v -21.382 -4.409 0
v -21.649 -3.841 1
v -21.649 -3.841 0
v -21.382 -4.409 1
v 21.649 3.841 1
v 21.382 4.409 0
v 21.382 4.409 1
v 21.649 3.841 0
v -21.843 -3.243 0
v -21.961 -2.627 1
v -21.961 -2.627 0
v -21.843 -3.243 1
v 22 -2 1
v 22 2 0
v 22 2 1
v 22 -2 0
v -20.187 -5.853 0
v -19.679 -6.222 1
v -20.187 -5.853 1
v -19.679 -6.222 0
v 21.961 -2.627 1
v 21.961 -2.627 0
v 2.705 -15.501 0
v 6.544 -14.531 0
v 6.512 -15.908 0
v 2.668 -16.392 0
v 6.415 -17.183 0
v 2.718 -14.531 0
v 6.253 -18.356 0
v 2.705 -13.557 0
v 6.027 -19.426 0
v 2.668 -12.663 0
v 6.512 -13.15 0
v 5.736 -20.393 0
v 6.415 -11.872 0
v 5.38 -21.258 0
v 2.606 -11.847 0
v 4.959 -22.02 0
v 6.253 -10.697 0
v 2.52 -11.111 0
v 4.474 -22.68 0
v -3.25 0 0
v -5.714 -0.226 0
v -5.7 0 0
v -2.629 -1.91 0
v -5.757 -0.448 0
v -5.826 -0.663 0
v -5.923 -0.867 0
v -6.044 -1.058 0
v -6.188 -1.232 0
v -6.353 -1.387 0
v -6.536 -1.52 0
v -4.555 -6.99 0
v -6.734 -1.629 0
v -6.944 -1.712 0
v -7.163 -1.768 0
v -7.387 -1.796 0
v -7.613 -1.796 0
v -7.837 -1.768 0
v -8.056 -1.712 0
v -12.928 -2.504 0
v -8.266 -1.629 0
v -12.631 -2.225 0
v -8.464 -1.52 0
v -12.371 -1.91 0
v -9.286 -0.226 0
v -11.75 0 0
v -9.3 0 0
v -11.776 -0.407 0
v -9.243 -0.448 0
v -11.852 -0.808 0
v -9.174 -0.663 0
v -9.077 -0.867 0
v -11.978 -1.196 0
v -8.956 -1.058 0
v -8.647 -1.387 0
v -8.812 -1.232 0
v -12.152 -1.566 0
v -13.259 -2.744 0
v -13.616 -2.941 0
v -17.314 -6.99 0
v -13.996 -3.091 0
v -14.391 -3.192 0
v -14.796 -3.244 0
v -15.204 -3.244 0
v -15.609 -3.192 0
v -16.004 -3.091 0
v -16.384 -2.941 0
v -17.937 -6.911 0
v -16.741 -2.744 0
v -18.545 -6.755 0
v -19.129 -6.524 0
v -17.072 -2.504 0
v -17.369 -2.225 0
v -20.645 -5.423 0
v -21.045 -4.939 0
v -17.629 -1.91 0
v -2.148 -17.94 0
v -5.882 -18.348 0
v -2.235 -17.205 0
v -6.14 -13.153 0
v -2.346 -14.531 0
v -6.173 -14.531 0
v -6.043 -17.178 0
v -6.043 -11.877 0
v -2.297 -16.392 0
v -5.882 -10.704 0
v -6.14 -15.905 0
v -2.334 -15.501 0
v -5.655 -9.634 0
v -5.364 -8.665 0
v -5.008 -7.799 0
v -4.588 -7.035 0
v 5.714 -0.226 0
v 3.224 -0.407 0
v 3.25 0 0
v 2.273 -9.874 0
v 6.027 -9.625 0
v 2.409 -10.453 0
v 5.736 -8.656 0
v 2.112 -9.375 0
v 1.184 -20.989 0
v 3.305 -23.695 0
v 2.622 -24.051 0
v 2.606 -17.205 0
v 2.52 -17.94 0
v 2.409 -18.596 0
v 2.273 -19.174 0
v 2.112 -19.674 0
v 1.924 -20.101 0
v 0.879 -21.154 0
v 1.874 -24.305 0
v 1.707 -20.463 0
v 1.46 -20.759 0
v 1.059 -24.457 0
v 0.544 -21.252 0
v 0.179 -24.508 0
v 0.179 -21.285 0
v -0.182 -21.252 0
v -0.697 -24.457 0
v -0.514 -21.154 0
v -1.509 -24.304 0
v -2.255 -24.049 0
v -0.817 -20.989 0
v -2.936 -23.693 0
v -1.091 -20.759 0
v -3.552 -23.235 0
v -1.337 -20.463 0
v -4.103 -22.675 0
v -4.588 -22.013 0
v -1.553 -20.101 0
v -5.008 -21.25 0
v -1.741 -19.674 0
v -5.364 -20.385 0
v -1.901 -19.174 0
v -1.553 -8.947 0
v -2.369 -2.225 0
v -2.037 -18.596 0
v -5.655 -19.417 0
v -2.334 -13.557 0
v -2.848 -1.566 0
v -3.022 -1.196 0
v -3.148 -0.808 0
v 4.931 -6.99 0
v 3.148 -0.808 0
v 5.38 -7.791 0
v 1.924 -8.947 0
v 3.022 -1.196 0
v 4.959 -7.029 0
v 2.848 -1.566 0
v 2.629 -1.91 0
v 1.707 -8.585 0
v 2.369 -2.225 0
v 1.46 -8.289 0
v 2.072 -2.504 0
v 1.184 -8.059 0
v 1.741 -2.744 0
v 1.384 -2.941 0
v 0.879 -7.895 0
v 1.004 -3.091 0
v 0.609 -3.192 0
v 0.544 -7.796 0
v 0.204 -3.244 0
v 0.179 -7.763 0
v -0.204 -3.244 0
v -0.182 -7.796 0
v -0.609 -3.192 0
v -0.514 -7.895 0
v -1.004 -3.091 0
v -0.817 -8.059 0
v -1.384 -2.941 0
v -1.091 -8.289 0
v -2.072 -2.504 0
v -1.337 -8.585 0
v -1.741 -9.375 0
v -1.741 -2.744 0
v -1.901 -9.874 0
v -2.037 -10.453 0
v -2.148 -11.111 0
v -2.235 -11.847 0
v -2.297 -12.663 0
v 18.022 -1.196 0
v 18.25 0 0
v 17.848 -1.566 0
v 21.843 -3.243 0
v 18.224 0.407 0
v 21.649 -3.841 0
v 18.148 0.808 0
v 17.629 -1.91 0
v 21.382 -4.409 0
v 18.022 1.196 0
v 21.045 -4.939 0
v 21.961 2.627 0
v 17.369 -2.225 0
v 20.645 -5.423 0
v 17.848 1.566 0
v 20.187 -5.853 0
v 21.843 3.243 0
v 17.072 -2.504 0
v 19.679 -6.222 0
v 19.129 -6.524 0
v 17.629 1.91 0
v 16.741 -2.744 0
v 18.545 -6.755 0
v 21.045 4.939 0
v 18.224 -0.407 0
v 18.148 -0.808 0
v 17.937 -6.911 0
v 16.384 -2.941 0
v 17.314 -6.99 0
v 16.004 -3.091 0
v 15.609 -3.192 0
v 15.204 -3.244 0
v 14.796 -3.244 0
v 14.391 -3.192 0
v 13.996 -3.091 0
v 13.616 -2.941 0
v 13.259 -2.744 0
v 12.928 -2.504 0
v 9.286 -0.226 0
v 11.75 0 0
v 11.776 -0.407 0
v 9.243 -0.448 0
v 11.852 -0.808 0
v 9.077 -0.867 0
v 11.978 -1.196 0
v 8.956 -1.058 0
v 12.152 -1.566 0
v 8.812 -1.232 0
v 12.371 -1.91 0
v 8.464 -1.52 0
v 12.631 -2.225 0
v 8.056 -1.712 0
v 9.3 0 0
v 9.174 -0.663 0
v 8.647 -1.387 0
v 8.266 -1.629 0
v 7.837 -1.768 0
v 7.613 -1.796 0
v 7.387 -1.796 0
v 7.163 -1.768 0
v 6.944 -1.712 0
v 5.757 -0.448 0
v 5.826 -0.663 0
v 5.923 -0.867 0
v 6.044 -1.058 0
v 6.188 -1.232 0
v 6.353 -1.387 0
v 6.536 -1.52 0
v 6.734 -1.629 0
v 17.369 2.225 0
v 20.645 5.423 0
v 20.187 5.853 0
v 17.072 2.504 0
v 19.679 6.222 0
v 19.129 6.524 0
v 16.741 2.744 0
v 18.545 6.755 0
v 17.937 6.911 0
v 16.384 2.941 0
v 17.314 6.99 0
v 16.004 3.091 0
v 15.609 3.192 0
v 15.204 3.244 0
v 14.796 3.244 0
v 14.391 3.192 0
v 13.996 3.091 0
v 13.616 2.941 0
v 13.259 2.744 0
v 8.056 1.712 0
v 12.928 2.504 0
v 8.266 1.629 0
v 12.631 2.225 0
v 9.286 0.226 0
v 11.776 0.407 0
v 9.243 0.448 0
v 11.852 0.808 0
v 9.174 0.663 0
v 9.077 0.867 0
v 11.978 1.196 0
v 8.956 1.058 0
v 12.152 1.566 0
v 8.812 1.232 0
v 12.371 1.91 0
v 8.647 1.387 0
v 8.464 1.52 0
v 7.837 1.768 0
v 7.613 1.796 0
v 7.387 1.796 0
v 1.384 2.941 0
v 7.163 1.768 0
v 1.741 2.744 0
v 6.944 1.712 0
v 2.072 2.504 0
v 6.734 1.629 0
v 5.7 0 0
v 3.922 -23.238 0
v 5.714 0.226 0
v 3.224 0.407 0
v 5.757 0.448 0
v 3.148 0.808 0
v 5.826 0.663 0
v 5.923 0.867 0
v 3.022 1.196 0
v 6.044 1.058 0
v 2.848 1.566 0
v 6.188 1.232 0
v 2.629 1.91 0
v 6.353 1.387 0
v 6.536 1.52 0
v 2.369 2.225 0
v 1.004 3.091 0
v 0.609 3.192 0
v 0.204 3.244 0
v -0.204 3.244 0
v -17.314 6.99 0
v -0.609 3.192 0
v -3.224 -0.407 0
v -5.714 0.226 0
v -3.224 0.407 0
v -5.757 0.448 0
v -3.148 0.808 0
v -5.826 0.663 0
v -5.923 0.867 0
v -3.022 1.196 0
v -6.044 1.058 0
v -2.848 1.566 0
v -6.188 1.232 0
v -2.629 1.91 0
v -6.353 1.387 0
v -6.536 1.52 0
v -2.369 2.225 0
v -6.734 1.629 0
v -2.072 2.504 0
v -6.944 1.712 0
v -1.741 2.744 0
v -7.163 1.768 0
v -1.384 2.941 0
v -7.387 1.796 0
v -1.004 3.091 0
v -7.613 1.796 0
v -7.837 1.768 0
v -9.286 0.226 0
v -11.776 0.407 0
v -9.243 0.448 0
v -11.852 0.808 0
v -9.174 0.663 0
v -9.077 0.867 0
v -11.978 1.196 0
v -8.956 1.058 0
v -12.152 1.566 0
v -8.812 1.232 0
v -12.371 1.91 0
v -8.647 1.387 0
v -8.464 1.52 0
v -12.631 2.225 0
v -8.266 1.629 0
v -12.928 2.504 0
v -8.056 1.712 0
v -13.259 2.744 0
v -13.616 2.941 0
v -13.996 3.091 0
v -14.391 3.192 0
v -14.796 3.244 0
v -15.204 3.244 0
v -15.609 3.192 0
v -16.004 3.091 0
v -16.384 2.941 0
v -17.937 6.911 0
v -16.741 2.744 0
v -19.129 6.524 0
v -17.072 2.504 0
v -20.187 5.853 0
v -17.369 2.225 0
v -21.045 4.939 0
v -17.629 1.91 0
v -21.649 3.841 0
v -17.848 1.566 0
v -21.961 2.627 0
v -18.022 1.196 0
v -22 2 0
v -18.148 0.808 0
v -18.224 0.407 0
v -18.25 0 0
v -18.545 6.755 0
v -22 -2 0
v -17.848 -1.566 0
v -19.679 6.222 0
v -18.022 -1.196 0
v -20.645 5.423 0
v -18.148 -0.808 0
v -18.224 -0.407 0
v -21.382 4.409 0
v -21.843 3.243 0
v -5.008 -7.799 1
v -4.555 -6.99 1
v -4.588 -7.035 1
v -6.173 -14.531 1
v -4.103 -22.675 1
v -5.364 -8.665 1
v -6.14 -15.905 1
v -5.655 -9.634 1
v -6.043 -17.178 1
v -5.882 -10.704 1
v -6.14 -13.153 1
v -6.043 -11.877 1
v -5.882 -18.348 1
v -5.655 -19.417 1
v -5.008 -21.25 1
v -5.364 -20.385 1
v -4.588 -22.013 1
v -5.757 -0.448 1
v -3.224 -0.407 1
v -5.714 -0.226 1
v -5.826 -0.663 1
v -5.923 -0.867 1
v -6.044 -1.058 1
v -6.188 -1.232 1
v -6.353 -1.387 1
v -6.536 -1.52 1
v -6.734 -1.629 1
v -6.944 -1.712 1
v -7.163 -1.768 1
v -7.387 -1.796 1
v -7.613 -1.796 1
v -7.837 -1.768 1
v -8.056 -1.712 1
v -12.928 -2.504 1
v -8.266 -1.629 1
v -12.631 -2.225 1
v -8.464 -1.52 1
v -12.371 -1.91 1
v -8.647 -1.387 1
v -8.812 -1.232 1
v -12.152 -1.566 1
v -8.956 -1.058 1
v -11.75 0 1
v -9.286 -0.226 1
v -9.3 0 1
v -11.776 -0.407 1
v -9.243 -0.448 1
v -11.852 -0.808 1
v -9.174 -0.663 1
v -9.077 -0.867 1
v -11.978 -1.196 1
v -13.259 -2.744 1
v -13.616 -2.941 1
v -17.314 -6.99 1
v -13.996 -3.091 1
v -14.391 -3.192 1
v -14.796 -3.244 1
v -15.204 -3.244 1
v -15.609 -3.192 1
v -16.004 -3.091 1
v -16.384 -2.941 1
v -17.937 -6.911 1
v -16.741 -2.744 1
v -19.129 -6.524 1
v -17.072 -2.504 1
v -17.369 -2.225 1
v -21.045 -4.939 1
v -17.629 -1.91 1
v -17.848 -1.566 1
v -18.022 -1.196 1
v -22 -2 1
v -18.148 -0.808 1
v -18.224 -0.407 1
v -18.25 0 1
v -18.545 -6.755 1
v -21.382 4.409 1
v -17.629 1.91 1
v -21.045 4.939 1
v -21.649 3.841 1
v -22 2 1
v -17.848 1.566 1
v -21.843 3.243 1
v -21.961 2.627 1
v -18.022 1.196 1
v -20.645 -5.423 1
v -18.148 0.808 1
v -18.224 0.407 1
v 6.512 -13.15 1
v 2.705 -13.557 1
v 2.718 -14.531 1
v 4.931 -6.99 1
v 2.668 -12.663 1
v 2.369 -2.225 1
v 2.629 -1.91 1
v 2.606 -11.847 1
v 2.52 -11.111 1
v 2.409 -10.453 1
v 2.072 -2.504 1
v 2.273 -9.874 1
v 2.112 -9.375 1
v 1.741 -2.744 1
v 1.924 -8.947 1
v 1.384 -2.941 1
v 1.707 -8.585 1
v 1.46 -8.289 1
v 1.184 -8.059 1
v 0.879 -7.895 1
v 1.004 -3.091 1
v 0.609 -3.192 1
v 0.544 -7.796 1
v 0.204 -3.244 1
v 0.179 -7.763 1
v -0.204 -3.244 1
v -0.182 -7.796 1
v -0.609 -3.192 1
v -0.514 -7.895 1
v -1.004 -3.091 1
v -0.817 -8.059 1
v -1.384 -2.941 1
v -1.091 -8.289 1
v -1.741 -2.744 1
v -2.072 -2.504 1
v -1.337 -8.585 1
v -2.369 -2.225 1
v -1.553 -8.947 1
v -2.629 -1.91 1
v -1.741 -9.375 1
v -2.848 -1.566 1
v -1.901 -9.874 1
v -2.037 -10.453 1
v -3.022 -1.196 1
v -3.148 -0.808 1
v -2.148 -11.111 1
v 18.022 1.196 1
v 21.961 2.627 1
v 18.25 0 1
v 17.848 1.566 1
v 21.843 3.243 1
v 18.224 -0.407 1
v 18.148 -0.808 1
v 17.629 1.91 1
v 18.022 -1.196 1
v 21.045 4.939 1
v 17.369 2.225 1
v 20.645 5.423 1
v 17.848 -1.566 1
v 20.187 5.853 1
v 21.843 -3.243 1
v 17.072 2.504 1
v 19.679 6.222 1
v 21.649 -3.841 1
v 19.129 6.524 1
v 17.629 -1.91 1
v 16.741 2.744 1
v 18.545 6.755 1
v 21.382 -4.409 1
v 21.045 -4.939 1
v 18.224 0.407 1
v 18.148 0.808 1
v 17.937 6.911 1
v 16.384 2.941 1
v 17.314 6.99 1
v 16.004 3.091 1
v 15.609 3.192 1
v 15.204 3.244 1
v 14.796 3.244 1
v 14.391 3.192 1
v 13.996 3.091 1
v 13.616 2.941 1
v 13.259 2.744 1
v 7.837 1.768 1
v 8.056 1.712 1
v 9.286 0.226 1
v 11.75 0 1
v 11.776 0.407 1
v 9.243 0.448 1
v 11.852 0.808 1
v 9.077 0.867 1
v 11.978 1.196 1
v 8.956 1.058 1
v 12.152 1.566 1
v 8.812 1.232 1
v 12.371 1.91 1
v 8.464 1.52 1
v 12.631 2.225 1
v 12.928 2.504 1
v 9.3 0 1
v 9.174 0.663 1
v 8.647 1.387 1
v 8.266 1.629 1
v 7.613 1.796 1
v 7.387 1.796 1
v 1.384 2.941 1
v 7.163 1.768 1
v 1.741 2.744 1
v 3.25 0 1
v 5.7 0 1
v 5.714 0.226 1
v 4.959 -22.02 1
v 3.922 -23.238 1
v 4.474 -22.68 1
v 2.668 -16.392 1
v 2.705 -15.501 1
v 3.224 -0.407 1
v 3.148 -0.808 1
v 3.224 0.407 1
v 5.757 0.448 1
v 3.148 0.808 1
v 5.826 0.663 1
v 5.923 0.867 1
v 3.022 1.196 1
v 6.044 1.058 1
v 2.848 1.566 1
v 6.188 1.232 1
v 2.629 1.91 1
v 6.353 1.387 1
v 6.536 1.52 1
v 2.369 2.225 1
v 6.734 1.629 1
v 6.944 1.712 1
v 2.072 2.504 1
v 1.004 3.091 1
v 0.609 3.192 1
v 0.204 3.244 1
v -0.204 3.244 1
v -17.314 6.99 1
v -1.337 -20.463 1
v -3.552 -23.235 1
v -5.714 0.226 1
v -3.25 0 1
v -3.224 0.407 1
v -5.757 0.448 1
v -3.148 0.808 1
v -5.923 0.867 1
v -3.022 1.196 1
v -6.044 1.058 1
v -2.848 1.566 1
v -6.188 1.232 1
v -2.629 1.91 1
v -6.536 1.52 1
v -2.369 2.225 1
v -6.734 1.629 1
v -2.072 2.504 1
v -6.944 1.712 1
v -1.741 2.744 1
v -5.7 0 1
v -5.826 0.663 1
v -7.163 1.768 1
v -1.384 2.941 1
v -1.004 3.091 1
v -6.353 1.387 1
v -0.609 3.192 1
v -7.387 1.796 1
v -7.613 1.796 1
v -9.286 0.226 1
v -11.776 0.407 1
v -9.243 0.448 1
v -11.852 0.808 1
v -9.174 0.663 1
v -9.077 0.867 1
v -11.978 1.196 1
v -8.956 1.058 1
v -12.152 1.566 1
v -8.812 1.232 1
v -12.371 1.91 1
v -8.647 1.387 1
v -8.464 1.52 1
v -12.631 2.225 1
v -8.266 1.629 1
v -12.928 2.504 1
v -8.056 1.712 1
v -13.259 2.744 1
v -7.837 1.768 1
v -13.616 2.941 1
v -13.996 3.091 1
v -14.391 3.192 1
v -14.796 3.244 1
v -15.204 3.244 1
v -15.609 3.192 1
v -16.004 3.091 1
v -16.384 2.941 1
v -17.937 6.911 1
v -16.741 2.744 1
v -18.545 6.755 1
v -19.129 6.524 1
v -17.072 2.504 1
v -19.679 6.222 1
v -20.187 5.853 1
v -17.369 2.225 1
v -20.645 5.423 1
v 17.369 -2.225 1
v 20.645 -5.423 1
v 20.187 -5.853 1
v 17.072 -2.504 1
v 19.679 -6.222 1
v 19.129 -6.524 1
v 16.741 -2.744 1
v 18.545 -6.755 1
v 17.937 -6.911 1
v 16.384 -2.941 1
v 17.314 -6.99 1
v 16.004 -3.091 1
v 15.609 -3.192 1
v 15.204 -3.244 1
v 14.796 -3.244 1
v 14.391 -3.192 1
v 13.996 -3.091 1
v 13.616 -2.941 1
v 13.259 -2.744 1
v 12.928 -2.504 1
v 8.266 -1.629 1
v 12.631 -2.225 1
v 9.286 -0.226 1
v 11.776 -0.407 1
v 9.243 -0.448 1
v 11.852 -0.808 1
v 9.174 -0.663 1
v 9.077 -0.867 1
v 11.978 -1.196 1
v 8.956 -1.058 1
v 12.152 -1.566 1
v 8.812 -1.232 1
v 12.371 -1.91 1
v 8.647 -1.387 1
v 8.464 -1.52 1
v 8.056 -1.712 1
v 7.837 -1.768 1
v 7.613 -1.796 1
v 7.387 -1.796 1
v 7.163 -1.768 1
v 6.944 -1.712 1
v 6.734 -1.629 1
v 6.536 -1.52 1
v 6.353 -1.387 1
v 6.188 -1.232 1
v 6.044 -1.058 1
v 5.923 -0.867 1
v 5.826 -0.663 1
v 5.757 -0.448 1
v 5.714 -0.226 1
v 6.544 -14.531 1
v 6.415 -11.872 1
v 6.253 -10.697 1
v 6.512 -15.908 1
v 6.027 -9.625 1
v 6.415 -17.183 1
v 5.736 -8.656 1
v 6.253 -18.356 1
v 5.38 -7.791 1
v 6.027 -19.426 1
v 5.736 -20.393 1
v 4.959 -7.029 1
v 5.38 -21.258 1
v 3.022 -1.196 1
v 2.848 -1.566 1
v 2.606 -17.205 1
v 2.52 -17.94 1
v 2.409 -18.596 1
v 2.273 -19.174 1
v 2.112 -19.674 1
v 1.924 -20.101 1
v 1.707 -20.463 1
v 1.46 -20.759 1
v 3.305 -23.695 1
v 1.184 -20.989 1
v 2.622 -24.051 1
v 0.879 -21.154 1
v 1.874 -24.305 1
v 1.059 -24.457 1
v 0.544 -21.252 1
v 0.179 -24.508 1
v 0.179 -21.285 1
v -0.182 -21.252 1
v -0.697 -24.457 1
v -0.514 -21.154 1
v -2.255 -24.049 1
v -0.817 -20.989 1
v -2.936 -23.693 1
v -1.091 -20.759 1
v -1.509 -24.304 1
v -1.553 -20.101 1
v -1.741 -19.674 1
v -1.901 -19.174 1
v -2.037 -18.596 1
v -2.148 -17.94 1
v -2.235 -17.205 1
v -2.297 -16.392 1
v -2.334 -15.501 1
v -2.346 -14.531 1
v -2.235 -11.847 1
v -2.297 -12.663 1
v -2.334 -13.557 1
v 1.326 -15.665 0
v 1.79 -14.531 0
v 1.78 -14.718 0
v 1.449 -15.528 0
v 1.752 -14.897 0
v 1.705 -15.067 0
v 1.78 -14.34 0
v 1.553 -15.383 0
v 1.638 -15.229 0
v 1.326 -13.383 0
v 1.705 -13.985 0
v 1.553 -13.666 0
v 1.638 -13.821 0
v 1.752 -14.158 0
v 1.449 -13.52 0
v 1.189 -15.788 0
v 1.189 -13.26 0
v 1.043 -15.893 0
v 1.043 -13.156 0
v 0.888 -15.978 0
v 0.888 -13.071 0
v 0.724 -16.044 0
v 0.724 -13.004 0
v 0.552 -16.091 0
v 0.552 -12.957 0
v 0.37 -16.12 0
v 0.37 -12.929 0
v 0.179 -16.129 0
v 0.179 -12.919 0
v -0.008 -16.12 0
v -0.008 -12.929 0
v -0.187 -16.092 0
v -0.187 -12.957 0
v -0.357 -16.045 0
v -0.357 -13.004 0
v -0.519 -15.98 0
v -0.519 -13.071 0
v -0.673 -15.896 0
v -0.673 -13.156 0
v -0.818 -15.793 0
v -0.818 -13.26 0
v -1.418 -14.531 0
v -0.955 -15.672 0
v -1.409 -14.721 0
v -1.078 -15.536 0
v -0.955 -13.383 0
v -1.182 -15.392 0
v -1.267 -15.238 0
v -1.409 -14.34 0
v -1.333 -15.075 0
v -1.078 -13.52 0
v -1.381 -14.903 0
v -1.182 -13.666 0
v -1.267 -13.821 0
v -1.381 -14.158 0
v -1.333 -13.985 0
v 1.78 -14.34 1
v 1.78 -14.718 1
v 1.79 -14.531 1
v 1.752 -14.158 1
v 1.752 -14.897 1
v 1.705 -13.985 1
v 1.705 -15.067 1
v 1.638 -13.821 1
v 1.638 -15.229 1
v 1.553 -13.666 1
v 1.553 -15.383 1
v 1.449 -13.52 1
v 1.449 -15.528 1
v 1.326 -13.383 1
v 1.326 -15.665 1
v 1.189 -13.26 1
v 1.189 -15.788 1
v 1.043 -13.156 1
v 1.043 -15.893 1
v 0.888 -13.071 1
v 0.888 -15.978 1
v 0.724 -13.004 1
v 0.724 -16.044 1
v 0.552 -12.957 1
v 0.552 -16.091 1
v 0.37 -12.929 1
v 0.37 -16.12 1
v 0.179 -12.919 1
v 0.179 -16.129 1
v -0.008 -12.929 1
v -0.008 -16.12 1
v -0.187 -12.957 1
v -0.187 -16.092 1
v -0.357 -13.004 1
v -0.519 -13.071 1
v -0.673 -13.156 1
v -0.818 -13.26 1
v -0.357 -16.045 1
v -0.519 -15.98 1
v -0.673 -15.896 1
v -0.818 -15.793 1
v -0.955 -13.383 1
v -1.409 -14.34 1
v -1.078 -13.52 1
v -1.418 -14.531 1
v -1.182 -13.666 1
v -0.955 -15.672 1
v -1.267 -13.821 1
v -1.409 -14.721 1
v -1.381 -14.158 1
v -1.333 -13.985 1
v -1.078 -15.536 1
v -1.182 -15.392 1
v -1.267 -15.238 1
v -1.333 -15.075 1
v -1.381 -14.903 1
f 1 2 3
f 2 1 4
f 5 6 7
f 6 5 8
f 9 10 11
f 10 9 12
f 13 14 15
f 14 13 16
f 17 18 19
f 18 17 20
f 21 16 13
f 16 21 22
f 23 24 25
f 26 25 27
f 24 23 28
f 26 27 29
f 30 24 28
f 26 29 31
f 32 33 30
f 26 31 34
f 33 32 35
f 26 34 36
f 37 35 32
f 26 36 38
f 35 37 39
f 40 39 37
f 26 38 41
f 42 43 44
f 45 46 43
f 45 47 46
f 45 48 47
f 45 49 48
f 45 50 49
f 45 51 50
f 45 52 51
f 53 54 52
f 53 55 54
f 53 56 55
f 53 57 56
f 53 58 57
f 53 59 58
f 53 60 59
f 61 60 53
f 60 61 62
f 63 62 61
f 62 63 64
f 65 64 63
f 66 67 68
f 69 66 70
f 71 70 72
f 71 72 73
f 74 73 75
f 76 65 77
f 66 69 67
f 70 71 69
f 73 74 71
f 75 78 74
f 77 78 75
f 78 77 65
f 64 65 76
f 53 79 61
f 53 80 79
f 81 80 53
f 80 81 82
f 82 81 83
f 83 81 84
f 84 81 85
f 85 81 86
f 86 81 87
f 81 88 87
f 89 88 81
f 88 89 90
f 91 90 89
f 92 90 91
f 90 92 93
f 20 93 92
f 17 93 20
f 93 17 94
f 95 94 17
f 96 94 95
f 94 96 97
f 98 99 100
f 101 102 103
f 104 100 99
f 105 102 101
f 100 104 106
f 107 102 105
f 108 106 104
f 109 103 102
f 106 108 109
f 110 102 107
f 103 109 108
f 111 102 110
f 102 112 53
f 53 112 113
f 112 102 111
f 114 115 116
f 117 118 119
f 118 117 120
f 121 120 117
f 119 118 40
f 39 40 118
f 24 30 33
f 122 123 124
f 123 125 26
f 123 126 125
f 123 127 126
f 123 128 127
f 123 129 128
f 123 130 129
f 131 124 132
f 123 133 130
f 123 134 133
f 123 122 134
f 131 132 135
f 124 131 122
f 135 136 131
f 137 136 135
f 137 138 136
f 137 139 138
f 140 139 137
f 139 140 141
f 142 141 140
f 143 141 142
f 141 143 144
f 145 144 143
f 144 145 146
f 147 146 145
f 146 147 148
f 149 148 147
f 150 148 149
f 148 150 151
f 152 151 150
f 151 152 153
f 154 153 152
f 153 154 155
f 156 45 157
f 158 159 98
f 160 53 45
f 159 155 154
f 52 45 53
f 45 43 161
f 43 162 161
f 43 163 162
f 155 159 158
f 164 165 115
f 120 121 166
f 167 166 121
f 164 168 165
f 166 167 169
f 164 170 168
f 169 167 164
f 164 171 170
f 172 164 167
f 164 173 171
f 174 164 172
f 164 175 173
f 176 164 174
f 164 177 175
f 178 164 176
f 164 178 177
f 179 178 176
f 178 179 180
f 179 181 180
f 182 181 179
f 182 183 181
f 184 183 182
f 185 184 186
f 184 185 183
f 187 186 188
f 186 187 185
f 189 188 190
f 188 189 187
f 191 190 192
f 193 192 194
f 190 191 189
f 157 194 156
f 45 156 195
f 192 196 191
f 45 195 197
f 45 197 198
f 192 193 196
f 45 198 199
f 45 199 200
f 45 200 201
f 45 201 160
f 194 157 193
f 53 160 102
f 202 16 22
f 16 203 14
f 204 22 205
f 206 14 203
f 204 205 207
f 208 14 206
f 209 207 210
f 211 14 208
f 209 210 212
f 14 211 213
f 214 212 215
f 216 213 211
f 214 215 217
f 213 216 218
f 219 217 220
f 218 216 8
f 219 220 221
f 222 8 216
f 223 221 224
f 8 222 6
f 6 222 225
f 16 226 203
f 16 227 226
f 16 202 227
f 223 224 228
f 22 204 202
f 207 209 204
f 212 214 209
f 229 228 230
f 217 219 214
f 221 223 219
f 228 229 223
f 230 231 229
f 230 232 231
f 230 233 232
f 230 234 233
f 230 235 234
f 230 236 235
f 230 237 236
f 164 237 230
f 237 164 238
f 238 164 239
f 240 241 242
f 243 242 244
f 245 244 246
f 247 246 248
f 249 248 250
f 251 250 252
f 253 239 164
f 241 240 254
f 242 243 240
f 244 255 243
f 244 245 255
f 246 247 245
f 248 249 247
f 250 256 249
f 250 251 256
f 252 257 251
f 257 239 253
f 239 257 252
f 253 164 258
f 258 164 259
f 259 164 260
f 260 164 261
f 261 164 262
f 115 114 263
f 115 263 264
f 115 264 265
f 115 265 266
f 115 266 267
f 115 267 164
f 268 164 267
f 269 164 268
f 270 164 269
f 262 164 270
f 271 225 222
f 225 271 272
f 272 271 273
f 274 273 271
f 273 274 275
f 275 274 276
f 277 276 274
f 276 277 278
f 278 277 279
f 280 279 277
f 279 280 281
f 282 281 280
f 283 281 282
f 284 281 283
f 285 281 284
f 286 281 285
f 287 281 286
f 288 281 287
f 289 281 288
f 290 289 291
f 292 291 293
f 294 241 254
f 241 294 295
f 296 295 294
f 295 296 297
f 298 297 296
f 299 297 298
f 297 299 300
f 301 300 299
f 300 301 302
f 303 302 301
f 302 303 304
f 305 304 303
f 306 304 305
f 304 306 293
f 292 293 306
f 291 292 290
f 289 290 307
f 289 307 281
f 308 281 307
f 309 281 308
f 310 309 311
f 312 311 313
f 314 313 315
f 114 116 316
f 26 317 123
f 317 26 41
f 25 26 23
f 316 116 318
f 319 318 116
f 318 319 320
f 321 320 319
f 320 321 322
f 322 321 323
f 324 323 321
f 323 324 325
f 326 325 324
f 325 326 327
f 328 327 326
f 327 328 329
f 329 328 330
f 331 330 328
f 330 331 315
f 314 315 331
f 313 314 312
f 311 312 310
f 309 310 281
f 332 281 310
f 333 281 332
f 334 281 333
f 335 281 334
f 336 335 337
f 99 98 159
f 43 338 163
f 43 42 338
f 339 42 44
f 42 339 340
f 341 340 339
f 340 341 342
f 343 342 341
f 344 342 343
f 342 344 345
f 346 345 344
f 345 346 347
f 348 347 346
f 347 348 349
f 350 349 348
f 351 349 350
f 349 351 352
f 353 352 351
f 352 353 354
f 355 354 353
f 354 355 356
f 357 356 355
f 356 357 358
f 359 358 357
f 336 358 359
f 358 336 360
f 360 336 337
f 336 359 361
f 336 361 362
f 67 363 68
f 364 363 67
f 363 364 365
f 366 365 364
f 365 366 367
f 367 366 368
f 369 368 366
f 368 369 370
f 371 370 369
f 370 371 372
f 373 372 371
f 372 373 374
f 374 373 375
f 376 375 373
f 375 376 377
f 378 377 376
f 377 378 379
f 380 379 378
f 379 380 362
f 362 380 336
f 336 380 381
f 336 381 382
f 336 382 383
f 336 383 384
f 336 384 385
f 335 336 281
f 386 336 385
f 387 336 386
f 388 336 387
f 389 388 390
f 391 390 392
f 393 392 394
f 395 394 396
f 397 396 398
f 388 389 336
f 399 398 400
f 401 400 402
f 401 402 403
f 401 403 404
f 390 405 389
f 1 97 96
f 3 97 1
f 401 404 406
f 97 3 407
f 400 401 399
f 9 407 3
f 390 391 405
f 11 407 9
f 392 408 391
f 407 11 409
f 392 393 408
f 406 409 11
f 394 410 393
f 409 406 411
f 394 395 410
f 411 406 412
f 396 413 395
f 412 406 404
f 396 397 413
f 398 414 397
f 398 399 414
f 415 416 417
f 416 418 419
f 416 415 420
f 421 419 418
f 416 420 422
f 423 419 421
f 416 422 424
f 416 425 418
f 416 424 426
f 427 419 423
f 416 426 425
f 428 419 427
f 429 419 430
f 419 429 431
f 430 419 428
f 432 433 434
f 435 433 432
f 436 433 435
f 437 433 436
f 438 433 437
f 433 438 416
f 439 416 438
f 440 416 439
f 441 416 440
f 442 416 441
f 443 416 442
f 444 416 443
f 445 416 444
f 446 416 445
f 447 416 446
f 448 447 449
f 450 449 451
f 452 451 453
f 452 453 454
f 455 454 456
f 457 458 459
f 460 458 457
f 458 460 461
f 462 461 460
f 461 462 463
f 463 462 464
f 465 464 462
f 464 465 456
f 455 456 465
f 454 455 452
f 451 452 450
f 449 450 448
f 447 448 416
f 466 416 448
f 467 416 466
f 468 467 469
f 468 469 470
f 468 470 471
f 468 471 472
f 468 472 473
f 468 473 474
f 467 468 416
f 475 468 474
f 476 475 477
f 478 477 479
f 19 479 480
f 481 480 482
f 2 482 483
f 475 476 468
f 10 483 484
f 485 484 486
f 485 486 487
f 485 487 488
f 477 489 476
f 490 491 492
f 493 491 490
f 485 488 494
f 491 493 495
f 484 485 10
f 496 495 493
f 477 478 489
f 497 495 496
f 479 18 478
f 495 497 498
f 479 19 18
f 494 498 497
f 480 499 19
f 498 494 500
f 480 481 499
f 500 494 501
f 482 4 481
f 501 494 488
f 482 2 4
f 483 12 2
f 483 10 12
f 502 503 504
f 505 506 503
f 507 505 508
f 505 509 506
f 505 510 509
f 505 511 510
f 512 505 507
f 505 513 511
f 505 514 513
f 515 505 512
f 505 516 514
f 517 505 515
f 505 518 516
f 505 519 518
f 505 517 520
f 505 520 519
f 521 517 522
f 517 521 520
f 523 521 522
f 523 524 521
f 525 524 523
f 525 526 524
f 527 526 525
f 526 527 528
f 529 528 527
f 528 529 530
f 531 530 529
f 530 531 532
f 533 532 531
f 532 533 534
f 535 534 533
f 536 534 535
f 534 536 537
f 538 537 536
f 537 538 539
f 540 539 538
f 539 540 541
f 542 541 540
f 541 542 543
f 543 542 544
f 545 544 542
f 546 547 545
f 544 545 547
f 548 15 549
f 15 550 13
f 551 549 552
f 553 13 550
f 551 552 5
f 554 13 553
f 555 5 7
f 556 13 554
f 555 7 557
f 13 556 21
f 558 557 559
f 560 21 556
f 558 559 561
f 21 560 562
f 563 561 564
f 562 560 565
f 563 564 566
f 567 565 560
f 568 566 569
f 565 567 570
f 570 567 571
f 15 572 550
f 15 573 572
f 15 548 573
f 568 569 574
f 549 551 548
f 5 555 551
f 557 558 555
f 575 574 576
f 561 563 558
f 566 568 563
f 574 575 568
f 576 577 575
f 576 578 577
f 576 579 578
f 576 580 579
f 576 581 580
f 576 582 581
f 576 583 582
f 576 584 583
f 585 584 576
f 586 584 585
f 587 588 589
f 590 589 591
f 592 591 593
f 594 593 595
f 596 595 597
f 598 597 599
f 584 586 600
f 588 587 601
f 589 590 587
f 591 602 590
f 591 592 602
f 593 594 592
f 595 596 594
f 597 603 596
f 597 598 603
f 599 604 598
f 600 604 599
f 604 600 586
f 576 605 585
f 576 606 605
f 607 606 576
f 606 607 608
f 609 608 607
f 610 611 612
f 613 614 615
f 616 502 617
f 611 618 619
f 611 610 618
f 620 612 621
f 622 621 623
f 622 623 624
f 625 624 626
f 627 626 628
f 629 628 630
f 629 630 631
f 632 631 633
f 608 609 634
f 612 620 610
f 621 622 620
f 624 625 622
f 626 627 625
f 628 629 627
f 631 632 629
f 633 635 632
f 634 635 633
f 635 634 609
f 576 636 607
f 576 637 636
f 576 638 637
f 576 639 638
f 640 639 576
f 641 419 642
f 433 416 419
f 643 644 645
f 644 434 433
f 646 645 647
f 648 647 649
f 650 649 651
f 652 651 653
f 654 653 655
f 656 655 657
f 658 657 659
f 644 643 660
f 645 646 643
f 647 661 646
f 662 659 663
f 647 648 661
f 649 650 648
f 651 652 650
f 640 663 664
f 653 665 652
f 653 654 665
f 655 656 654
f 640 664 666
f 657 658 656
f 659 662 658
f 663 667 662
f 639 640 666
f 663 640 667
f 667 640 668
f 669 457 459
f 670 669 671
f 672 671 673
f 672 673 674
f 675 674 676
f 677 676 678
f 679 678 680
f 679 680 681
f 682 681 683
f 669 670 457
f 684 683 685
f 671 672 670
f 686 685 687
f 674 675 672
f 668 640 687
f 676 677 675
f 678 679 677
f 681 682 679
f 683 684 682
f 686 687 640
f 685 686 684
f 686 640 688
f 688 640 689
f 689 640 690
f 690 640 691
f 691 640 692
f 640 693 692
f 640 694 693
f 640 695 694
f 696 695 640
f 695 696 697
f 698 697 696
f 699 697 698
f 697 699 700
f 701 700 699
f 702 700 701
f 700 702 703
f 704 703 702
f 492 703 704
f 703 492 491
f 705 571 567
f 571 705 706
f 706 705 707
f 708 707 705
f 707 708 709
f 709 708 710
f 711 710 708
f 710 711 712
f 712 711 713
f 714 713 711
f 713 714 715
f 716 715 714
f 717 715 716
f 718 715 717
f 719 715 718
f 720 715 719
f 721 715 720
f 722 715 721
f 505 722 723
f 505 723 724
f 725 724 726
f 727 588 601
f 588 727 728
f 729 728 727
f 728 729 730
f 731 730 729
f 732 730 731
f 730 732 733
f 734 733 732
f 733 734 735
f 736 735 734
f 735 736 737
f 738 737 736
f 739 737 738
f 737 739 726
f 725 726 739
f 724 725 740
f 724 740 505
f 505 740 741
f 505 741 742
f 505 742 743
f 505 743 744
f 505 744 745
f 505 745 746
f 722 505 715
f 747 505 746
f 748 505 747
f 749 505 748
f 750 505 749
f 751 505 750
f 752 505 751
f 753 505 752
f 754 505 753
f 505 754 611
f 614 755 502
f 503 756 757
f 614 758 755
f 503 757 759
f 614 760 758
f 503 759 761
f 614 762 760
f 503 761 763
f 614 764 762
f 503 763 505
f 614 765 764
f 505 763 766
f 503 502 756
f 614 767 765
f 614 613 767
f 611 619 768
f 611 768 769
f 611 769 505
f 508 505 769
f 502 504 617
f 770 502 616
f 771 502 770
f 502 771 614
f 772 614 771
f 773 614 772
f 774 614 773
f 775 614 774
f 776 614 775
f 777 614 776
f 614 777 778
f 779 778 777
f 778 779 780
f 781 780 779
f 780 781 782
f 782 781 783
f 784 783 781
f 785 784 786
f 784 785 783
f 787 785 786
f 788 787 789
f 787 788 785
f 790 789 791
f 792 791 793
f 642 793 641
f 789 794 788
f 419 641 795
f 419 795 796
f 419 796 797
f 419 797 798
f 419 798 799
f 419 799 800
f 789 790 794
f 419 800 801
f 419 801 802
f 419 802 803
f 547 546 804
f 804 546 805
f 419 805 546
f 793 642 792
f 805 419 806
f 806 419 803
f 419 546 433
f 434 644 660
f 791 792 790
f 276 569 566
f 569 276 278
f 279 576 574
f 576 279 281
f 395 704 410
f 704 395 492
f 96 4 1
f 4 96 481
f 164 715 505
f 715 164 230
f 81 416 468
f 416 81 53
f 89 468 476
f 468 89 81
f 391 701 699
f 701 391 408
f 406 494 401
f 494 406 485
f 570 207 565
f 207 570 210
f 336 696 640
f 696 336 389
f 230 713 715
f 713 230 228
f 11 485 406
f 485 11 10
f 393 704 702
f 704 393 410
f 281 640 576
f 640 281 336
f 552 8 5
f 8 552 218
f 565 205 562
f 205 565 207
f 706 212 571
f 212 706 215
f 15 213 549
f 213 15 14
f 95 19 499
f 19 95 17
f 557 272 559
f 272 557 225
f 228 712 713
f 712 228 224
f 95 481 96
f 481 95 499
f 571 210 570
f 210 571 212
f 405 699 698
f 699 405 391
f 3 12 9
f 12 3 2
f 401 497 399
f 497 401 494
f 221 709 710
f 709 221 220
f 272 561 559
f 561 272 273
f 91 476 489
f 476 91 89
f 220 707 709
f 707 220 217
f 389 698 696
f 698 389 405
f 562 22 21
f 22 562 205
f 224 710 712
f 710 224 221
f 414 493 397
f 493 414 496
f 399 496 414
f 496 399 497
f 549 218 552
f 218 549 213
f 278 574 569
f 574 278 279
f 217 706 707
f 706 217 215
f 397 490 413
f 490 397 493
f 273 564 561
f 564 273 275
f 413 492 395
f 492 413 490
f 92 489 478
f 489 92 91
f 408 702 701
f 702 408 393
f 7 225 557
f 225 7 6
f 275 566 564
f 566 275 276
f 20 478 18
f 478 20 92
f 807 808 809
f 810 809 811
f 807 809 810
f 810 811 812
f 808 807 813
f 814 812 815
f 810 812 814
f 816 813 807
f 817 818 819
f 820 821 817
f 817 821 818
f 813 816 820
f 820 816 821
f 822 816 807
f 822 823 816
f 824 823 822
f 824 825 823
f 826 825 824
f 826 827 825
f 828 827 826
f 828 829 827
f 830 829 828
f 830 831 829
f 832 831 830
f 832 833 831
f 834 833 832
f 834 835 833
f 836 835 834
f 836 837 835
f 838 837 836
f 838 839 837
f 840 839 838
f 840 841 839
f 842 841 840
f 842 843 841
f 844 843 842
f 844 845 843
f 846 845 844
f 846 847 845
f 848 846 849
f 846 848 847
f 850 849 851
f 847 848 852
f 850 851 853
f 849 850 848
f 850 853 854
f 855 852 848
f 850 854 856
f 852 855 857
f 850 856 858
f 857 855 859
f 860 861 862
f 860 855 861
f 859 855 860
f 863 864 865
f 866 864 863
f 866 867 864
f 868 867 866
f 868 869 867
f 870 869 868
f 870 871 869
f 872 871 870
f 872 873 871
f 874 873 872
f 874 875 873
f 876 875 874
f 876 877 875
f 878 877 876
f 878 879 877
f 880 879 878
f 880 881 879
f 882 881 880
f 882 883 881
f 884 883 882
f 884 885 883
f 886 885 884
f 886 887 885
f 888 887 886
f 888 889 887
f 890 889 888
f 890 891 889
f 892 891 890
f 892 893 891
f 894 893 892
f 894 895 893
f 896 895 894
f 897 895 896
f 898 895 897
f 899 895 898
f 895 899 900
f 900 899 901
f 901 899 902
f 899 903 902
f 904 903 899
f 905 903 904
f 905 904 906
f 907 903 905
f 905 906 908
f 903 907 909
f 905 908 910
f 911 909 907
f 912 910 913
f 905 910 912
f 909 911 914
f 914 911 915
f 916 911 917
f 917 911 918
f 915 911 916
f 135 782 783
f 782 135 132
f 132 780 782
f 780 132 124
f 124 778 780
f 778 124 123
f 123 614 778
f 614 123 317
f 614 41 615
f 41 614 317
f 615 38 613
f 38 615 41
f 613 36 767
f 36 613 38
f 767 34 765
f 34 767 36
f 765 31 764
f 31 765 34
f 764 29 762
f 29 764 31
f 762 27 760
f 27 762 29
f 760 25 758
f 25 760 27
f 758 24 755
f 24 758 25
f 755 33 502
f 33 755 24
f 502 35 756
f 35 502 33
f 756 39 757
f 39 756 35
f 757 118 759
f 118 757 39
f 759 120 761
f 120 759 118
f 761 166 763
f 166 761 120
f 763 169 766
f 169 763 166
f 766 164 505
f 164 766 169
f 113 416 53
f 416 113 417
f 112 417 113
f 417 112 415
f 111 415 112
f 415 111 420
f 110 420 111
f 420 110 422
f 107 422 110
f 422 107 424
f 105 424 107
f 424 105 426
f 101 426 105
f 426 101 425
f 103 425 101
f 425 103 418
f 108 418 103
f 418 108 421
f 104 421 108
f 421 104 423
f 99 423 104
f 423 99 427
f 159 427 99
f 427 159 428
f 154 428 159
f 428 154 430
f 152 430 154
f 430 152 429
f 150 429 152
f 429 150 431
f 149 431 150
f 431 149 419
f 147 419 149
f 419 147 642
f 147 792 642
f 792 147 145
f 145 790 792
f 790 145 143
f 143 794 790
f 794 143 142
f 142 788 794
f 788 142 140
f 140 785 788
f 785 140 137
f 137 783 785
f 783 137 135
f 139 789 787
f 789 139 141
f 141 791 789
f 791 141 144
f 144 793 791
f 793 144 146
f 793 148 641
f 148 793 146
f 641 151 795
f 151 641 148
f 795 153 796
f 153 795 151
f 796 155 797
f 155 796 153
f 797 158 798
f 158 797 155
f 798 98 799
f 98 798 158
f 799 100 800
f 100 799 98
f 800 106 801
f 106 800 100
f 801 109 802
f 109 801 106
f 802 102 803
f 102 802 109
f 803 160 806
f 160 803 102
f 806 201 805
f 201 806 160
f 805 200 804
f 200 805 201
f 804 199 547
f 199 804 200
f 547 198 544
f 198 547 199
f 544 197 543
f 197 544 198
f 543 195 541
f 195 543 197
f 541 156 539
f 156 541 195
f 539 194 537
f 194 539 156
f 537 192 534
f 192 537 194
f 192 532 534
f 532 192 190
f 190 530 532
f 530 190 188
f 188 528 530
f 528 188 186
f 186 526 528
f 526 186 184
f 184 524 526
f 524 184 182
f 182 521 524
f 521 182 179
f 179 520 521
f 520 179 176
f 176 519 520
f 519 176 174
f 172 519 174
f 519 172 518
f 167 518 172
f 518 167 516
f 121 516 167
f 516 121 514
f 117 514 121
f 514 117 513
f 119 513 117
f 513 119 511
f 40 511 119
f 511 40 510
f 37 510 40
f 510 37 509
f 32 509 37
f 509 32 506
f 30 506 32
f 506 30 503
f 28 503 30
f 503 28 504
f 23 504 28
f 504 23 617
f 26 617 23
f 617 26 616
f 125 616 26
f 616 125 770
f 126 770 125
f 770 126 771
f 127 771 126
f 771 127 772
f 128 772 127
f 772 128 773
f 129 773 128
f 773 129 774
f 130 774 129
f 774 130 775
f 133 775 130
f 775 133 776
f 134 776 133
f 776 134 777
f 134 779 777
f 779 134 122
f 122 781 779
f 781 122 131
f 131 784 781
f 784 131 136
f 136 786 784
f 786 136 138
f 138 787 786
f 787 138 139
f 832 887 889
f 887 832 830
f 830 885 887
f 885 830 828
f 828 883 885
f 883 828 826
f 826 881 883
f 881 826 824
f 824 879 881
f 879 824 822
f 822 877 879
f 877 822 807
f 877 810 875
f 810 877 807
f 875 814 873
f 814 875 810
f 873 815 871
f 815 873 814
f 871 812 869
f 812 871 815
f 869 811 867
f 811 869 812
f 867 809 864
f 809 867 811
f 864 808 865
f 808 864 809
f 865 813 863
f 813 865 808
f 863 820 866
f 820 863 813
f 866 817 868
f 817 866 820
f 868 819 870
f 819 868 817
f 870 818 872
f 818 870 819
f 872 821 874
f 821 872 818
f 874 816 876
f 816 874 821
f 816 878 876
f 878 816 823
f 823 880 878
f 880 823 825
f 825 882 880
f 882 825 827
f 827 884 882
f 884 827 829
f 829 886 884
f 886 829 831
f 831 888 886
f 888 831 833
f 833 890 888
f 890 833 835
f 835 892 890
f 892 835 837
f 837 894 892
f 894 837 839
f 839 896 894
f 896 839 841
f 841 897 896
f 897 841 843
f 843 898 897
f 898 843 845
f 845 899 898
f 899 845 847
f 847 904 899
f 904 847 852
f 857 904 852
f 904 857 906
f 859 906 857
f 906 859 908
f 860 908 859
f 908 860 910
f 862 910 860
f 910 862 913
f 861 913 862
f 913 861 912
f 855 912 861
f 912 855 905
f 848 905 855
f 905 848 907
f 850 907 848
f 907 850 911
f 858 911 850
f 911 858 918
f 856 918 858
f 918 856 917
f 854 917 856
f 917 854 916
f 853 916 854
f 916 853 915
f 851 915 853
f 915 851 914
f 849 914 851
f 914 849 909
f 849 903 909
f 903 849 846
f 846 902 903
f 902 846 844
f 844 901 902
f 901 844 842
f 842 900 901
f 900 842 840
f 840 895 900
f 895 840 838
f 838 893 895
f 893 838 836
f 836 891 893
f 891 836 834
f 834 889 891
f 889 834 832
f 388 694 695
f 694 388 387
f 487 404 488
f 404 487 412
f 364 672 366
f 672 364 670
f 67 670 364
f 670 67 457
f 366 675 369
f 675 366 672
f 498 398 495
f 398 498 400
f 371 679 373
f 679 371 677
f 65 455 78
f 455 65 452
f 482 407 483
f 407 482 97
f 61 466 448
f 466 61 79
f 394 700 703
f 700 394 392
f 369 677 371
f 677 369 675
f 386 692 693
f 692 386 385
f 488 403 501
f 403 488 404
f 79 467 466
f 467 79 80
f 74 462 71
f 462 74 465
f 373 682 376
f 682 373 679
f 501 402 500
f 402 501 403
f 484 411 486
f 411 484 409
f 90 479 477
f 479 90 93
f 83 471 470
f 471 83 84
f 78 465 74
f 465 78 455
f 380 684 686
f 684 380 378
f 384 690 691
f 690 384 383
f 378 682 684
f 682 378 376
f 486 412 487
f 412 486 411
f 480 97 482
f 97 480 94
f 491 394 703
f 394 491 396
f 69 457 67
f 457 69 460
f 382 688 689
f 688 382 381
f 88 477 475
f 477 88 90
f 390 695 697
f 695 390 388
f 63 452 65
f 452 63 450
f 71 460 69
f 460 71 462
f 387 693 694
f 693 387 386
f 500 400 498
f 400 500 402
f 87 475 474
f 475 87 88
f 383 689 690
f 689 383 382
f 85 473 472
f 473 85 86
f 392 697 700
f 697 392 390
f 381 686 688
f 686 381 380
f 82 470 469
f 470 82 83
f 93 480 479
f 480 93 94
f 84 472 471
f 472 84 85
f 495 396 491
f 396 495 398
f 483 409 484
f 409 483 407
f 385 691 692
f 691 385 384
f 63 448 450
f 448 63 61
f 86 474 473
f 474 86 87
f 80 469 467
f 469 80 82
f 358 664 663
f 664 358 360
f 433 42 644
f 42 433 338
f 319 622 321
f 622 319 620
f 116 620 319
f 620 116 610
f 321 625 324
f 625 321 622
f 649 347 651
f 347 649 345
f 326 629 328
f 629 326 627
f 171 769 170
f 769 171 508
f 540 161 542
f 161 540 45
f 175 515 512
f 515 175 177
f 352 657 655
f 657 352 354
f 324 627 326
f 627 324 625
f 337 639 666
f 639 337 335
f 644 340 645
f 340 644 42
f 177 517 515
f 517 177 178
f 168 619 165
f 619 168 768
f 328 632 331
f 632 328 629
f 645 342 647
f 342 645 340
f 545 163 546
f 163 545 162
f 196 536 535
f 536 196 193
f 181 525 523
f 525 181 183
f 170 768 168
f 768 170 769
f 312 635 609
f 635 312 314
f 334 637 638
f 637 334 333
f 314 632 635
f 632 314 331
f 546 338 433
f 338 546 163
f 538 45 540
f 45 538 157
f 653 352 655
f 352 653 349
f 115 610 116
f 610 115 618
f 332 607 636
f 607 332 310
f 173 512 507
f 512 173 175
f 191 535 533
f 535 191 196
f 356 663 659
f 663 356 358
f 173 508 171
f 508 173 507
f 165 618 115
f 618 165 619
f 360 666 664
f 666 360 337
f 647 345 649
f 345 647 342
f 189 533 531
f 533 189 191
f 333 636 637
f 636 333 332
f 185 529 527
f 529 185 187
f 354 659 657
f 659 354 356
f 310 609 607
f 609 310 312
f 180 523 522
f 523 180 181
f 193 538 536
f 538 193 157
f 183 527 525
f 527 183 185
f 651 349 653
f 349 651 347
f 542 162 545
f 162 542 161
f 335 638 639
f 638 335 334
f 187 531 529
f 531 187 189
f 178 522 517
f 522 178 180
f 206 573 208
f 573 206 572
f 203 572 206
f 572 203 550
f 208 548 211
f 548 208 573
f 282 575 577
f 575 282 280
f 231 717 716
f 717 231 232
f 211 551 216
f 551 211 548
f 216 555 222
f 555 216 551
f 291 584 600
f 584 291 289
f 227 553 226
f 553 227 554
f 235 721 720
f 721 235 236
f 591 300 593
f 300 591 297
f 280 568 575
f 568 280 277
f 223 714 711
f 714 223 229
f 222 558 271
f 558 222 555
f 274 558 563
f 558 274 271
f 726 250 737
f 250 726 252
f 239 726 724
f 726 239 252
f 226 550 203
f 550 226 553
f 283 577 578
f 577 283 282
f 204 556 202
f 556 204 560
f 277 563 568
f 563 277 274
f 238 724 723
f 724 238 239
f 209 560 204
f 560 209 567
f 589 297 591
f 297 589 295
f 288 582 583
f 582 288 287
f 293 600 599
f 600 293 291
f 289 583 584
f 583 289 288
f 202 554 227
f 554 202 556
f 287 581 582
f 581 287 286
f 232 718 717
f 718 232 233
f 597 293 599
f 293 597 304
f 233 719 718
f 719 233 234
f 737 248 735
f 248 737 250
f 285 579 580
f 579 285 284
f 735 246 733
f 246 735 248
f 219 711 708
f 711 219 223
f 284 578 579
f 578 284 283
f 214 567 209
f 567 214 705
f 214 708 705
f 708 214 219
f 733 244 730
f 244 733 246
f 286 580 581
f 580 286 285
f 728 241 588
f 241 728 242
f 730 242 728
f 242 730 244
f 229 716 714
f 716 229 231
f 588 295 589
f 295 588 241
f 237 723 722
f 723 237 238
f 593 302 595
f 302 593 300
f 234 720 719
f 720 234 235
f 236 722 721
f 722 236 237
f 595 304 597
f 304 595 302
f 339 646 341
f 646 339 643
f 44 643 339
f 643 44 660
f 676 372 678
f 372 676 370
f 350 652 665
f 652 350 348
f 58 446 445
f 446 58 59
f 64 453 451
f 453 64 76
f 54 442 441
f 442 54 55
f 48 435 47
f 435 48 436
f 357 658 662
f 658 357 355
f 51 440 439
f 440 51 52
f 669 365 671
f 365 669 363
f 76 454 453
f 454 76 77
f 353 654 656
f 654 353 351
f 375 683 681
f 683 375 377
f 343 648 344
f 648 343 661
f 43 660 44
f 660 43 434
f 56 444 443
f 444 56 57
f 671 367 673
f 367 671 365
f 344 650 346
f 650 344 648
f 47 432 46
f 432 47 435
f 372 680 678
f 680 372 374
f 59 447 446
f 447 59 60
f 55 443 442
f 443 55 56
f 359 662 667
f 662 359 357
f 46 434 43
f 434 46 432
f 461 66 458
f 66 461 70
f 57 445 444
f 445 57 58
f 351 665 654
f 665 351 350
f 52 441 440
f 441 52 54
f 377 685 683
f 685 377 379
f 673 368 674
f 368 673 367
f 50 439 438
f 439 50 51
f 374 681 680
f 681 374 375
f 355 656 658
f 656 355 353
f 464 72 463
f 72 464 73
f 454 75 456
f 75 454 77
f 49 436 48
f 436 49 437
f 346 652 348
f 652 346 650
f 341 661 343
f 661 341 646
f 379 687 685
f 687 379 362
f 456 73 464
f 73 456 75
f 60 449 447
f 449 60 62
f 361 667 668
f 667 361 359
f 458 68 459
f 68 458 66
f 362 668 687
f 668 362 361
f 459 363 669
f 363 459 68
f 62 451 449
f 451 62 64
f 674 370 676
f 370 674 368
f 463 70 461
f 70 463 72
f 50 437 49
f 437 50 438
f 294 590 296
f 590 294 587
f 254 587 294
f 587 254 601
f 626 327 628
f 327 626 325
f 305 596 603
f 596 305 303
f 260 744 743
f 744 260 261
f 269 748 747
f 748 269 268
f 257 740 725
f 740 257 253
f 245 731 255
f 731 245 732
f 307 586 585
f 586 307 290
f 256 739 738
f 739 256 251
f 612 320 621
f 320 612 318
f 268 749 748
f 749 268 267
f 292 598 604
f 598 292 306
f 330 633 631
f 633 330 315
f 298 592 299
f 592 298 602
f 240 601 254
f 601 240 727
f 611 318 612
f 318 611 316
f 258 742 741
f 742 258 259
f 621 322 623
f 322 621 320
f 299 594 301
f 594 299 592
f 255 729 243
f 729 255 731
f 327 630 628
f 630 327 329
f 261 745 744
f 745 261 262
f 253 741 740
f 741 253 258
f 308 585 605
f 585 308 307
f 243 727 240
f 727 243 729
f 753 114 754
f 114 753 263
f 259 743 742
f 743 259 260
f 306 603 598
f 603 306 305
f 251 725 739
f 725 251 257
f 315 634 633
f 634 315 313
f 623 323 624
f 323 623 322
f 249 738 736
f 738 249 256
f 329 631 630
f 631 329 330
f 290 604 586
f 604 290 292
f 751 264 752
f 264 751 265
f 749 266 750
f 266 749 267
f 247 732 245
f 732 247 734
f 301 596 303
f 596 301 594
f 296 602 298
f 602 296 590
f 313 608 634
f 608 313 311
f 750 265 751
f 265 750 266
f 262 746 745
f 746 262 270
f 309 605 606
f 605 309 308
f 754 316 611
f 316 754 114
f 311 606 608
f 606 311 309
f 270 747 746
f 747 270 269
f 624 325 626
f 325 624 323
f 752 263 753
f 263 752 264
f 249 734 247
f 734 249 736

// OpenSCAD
$fn = 50;


difference() {
	union() {
		hull() {
			translate(v = [-17.0000000000, 2.0000000000, 0]) {
				cylinder(h = 1, r = 5);
			}
			translate(v = [17.0000000000, 2.0000000000, 0]) {
				cylinder(h = 1, r = 5);
			}
			translate(v = [-17.0000000000, -2.0000000000, 0]) {
				cylinder(h = 1, r = 5);
			}
			translate(v = [17.0000000000, -2.0000000000, 0]) {
				cylinder(h = 1, r = 5);
			}
		}
		translate(v = [0, -5, 0]) {
			linear_extrude(height = 1) {
				text(font = "DejaVu Sans Mono:style=Bold", halign = "center", size = 19.0000000000, text = "0", valign = "top");
			}
		}
	}
	union() {
		translate(v = [-15.0000000000, 0.0000000000, 0]) {
			translate(v = [0, 0, -100]) {
				cylinder(h = 200, r = 3.2500000000);
			}
		}
		translate(v = [0, 0, -100]) {
			cylinder(h = 200, r = 3.2500000000);
		}
		translate(v = [15.0000000000, 0.0000000000, 0]) {
			translate(v = [0, 0, -100]) {
				cylinder(h = 200, r = 3.2500000000);
			}
		}
		translate(v = [-15.0000000000, 0.0000000000, 0]) {
			translate(v = [0, 0, -100]) {
				cylinder(h = 200, r = 1.8000000000);
			}
		}
		translate(v = [-7.5000000000, 0.0000000000, 0]) {
			translate(v = [0, 0, -100]) {
				cylinder(h = 200, r = 1.8000000000);
			}
		}
		translate(v = [0, 0, -100]) {
			cylinder(h = 200, r = 1.8000000000);
		}
		translate(v = [7.5000000000, 0.0000000000, 0]) {
			translate(v = [0, 0, -100]) {
				cylinder(h = 200, r = 1.8000000000);
			}
		}
		translate(v = [15.0000000000, 0.0000000000, 0]) {
			translate(v = [0, 0, -100]) {
				cylinder(h = 200, r = 1.8000000000);
			}
		}
	}
}
